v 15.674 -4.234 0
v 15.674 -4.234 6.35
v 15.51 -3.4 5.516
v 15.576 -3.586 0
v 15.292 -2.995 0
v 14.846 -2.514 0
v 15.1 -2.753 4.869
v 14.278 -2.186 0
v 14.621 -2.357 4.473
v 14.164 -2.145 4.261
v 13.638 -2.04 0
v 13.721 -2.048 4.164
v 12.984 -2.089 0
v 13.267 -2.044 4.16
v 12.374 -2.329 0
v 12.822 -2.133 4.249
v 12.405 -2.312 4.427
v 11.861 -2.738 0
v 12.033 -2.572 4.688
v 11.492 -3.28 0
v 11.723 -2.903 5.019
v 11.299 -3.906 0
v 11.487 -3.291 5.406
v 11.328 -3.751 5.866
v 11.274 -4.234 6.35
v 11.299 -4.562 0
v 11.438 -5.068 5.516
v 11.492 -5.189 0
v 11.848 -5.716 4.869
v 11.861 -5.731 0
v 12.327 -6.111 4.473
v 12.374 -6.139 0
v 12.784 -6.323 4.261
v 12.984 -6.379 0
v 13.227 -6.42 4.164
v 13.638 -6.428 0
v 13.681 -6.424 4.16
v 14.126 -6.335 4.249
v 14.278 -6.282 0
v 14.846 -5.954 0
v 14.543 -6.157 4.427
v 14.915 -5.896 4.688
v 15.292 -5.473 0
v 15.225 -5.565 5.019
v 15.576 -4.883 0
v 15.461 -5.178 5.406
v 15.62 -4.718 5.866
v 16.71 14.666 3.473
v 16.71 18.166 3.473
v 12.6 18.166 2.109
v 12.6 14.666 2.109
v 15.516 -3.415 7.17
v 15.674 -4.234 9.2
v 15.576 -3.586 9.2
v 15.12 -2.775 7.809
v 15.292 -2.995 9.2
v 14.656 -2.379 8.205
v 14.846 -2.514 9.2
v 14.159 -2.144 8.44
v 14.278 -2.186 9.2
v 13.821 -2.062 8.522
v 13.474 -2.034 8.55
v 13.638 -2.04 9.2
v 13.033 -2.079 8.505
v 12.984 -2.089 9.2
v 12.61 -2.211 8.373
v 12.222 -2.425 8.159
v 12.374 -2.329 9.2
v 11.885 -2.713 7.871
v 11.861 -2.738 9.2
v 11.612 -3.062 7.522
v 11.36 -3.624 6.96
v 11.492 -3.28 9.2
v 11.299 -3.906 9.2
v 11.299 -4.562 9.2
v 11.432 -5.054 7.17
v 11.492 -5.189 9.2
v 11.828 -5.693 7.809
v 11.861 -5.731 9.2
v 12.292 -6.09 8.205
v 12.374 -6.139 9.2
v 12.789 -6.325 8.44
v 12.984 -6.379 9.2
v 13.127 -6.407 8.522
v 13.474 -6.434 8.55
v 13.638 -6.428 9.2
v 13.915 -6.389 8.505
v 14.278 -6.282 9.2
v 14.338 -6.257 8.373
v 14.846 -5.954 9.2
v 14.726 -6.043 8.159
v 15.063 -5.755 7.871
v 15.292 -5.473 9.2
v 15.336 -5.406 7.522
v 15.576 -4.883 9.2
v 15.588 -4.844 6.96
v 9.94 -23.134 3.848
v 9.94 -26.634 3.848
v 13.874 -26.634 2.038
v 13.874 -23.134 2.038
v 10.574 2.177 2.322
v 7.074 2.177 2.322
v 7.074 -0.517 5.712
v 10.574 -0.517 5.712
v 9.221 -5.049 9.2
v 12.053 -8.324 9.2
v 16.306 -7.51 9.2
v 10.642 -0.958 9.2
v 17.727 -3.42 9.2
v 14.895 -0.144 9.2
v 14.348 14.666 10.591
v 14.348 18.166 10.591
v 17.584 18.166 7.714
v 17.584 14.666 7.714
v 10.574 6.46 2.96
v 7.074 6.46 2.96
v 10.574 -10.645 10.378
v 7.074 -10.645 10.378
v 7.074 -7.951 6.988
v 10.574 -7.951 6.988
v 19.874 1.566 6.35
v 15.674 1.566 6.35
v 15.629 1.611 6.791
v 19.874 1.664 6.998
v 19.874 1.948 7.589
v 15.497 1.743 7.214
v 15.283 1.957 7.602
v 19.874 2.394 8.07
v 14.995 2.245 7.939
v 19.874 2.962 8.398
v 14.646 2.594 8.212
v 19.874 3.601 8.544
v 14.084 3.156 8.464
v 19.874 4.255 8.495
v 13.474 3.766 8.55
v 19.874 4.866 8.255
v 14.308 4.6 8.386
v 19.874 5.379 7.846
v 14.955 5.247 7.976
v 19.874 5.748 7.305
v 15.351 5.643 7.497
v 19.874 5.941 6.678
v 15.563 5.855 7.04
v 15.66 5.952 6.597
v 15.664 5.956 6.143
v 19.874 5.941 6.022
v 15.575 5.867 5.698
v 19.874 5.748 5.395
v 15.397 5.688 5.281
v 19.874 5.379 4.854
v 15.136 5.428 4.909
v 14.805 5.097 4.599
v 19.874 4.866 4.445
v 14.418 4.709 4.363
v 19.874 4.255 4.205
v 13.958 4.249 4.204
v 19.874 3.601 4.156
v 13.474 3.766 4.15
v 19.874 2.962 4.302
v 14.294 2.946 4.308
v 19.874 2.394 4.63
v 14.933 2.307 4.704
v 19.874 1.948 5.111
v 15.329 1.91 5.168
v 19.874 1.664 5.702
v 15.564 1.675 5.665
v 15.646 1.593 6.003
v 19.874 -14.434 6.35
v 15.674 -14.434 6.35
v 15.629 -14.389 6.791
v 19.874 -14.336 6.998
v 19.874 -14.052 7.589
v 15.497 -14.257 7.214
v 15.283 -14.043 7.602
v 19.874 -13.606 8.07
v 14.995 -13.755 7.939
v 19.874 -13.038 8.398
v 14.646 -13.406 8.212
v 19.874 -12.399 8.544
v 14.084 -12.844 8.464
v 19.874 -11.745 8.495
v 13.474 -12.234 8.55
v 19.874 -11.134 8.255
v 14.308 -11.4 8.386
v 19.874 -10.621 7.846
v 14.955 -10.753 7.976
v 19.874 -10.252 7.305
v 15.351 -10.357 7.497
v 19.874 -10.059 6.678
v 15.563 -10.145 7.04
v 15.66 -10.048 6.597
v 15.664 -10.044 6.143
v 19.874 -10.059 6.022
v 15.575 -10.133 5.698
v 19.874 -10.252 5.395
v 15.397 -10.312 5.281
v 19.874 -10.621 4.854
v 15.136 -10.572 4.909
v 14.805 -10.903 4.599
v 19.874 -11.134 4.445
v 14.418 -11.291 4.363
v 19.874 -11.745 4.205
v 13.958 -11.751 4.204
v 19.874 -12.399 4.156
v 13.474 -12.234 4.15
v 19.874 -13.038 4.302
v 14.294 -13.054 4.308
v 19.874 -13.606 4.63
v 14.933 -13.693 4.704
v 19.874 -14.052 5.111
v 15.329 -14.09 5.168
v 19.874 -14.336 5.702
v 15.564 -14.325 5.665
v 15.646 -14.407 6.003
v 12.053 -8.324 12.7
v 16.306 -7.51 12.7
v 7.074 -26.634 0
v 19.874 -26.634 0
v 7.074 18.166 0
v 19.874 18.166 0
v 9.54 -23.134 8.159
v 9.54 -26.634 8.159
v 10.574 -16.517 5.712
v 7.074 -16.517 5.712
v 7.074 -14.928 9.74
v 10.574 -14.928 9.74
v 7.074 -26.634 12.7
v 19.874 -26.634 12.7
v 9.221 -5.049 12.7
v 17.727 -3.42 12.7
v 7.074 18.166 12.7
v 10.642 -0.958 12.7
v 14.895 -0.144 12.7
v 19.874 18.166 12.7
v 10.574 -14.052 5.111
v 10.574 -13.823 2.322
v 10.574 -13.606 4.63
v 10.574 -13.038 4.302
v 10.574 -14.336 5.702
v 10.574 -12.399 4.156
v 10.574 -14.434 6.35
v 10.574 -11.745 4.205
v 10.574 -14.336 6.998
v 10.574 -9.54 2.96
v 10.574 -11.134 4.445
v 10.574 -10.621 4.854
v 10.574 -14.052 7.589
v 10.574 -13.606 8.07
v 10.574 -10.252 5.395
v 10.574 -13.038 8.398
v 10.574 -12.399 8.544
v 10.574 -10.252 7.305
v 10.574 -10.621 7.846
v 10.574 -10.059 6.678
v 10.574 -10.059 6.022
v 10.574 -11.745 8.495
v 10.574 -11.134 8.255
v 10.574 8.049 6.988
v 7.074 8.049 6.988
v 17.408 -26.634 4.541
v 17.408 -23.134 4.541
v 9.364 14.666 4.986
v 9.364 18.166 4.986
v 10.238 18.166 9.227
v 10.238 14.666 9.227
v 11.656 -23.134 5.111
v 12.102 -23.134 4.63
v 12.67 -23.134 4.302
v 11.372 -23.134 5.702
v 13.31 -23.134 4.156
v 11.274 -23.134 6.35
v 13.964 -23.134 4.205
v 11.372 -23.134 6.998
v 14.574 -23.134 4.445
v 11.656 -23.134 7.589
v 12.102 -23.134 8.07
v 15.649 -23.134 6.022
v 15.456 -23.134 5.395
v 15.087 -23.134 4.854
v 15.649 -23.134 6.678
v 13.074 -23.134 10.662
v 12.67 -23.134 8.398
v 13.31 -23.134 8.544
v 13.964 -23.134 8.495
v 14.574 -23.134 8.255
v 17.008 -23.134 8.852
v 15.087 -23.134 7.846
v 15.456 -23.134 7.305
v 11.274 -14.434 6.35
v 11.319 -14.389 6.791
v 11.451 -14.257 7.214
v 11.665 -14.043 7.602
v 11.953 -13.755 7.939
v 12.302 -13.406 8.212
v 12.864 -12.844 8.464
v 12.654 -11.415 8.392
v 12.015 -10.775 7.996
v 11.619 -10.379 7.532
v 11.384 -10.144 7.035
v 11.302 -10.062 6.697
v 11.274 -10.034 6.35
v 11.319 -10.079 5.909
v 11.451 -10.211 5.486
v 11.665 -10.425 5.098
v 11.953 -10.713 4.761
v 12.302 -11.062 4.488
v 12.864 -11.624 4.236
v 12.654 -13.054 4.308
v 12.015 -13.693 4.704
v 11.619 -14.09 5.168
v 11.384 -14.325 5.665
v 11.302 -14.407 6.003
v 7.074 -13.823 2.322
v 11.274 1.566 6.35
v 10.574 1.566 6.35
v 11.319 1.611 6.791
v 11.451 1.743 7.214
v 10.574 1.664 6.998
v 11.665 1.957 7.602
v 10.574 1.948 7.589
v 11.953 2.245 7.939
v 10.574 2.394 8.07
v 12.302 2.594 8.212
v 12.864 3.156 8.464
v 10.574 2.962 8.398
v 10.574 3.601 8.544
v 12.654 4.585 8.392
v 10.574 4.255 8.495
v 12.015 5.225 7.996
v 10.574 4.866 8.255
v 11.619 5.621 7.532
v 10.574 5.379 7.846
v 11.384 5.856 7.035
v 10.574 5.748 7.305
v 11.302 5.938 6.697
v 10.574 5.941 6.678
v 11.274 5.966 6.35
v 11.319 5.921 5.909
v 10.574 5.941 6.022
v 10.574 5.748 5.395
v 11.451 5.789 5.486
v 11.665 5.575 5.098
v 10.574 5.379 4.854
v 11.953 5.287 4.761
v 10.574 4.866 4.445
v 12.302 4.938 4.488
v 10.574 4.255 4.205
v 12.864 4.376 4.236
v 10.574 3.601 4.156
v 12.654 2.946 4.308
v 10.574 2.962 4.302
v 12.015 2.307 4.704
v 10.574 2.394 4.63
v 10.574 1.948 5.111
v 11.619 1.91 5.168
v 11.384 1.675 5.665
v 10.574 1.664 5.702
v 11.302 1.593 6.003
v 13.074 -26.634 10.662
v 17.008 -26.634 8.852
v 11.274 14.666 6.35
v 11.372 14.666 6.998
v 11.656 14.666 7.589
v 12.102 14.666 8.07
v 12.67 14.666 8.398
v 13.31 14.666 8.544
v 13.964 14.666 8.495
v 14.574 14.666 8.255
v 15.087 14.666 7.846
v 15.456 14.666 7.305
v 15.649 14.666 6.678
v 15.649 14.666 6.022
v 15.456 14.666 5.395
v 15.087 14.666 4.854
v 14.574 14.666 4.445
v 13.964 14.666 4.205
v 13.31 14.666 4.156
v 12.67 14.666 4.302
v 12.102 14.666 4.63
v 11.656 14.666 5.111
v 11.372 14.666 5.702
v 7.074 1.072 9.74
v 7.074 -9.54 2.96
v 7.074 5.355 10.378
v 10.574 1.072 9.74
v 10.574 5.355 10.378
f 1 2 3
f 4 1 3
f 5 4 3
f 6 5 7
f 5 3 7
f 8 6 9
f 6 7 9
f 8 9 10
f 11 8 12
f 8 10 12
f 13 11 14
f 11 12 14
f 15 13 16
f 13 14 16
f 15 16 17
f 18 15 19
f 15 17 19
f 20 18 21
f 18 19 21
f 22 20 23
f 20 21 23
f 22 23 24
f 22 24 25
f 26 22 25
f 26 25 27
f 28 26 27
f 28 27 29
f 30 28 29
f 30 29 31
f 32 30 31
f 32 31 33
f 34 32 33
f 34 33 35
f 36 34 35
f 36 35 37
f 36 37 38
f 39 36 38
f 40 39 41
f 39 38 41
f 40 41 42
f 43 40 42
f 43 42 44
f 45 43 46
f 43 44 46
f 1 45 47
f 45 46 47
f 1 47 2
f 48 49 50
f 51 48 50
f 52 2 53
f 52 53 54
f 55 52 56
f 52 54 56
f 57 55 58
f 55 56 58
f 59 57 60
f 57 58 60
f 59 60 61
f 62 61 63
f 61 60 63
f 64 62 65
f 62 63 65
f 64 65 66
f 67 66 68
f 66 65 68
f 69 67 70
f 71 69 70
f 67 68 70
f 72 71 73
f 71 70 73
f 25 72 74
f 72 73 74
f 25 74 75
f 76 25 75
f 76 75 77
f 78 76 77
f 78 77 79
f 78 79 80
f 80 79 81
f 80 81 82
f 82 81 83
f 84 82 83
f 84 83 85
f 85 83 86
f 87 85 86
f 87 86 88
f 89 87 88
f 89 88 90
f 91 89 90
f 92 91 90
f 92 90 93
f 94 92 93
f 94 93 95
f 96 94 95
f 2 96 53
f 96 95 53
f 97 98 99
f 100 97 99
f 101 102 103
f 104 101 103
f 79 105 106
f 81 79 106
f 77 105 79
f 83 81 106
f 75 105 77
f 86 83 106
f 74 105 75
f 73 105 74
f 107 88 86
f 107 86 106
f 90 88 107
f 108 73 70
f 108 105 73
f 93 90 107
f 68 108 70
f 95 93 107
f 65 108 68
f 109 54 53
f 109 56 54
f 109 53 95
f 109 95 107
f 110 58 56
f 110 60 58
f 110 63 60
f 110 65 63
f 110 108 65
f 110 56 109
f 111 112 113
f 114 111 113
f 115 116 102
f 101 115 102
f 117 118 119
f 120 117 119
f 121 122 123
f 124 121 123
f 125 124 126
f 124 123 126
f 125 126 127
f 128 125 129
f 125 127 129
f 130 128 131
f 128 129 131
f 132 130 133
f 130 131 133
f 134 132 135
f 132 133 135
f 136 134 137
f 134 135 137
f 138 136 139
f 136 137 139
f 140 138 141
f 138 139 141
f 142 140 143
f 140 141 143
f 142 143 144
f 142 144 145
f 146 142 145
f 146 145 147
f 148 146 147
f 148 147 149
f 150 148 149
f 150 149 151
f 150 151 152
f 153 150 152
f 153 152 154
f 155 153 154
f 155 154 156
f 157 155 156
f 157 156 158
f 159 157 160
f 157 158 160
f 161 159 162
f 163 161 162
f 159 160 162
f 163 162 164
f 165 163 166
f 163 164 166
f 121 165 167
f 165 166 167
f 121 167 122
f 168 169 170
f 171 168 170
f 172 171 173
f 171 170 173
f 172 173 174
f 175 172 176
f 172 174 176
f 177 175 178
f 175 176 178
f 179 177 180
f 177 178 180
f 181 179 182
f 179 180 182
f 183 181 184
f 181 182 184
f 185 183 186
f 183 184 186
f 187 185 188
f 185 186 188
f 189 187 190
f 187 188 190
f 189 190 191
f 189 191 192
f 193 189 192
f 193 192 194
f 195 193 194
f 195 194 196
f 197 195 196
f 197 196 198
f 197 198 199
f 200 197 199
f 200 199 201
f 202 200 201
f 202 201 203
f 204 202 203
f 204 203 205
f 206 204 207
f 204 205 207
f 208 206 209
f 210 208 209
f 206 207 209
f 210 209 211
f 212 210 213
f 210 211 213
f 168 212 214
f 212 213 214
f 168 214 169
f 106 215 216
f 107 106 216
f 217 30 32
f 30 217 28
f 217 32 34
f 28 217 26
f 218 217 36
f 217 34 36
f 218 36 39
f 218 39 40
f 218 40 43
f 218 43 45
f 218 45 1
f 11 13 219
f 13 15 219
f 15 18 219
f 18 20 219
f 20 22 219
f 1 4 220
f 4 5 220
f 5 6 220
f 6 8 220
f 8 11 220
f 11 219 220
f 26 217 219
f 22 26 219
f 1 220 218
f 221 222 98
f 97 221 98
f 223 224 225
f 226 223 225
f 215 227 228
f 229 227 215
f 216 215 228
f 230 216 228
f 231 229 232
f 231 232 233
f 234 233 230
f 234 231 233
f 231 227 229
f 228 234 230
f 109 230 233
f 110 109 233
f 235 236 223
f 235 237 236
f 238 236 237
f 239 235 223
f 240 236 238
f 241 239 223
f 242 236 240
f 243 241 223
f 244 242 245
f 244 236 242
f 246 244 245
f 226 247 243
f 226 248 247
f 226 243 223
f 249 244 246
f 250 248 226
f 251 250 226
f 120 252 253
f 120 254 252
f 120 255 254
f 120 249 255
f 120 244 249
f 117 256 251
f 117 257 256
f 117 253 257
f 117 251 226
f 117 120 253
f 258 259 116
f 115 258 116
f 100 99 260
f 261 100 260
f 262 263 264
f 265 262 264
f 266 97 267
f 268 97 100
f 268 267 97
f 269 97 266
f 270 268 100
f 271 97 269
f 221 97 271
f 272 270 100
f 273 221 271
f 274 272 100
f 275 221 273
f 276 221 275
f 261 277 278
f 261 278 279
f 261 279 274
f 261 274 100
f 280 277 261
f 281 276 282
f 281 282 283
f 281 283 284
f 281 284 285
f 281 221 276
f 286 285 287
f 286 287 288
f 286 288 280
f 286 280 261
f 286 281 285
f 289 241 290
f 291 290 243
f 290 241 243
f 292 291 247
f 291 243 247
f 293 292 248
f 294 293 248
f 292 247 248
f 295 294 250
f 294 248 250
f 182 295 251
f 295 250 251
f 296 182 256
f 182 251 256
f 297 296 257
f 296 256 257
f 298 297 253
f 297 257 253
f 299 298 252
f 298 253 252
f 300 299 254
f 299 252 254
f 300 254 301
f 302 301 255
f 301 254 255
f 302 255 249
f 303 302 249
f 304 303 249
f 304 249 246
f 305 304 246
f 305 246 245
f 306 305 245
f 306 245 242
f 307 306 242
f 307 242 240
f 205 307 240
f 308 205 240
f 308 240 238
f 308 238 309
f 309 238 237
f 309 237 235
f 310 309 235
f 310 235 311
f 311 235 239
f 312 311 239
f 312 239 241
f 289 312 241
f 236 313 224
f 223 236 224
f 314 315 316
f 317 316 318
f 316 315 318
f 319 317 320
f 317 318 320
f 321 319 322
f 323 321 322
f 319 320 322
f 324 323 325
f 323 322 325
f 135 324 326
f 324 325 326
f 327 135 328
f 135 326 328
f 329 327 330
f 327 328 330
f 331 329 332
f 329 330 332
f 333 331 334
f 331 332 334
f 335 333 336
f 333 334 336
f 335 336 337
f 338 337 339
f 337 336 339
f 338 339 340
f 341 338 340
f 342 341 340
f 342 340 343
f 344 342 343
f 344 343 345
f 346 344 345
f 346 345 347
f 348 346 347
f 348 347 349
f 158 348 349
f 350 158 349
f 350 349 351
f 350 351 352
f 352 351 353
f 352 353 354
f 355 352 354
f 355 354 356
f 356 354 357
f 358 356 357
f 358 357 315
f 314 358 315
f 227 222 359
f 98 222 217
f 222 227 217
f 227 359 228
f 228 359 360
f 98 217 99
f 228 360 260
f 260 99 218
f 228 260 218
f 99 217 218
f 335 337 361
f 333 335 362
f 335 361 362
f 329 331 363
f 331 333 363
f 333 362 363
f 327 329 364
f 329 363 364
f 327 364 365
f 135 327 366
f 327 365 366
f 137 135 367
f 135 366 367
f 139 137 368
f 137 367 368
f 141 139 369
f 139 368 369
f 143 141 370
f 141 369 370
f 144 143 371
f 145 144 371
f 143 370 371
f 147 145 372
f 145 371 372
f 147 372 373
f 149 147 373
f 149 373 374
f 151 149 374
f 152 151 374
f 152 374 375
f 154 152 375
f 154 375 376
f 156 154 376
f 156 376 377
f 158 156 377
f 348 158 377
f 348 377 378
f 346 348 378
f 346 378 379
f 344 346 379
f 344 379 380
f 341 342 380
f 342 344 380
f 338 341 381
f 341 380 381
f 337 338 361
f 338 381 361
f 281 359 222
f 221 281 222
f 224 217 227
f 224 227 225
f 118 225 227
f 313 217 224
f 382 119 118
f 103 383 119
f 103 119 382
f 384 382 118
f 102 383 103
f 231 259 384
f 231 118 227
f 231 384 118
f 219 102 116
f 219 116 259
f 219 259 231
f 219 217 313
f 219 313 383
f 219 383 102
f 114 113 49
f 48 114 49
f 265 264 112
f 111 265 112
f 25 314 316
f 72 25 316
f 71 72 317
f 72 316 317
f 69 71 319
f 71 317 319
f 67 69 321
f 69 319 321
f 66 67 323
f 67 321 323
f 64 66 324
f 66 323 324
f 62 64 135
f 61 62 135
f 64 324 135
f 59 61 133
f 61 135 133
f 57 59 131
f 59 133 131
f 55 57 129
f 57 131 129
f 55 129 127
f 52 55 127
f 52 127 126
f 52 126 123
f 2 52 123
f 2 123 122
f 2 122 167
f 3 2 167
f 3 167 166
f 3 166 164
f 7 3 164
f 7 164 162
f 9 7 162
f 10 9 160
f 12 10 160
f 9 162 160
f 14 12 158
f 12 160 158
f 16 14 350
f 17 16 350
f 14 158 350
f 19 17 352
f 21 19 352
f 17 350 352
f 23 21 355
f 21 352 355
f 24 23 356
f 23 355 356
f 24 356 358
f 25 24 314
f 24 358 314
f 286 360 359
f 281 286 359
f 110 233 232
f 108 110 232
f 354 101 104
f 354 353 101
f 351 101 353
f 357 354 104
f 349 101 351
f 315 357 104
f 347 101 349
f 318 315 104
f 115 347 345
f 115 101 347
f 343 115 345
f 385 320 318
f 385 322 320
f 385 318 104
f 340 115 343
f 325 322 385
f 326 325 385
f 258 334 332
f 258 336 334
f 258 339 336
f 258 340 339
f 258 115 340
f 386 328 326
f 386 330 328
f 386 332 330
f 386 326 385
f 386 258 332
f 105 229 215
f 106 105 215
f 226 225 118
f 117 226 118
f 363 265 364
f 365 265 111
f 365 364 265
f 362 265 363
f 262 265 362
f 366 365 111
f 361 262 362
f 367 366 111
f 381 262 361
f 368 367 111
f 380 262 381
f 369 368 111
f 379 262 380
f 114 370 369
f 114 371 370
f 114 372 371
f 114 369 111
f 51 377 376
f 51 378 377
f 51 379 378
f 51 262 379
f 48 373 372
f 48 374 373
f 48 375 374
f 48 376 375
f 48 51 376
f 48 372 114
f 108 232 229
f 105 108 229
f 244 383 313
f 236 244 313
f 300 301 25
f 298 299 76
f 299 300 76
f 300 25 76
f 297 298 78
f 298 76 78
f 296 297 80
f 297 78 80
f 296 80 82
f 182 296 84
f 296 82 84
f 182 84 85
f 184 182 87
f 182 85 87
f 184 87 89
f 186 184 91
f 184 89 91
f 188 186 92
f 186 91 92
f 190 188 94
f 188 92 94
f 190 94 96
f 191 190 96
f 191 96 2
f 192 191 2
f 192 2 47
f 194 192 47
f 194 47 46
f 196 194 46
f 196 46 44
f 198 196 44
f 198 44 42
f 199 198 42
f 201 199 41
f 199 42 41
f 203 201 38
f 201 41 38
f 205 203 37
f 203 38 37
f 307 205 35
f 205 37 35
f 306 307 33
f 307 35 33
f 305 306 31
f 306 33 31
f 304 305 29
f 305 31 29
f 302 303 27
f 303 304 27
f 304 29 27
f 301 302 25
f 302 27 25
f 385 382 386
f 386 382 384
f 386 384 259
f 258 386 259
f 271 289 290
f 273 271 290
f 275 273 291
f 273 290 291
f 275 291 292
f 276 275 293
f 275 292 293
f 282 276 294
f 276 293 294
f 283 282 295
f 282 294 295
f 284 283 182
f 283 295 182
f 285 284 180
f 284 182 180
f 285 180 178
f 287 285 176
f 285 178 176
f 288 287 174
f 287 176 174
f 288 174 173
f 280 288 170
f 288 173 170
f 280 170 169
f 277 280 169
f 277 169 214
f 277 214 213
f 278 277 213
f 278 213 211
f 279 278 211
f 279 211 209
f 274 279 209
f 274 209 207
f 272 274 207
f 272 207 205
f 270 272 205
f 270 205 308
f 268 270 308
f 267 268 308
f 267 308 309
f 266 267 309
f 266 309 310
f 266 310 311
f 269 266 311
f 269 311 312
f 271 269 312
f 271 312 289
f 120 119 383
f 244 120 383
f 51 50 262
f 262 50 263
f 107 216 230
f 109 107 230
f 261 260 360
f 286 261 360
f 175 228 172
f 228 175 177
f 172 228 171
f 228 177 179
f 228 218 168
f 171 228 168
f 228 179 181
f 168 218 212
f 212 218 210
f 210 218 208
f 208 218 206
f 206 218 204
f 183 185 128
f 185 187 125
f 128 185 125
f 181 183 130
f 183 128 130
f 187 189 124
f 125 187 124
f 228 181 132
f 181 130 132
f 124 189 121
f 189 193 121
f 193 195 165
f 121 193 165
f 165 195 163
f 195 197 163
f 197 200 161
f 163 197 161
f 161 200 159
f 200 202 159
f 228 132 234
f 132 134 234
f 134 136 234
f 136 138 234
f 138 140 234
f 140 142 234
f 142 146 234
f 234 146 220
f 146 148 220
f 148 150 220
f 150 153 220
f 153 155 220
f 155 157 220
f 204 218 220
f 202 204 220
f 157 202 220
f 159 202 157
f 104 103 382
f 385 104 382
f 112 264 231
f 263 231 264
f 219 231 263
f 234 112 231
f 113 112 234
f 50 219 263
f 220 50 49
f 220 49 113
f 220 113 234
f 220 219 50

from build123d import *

# Parameters (mm, degrees)
SKETCH_1_W          = 12.8
SKETCH_1_H          = 44.8
EXTRUDE_1_DEPTH     = 12.7
SKETCH_2_R          = 2.2
CUT_EXTRUDE_1_DEPTH = 36.575886954
SKETCH_3_R          = 2.2
CUT_EXTRUDE_2_DEPTH = 33.16376457
SKETCH_4_R          = 2.2
CUT_EXTRUDE_3_DEPTH = 51.629102117
CUT_EXTRUDE_4_DEPTH = 3.5
CUT_EXTRUDE_5_DEPTH = 3.5
CUT_EXTRUDE_6_DEPTH = 3.5
CUT_EXTRUDE_7_DEPTH = 3.5


with BuildPart() as part:
    # 草圖1 → 填料-伸長1 (new body)
    with BuildSketch(Plane.XY):
        with Locations((13.474002647, -4.234146341)):
            Rectangle(SKETCH_1_W, SKETCH_1_H)
    extrude(amount=EXTRUDE_1_DEPTH)

    # 草圖2 → 除料-伸長1 (cut, through all)
    with BuildSketch(Plane.XY.offset(12.7)):
        with Locations((13.474002647, -4.234146341)):
            Circle(SKETCH_2_R)
    extrude(amount=-CUT_EXTRUDE_1_DEPTH, mode=Mode.SUBTRACT)

    # 草圖3 → 除料-伸長2 (cut, through all)
    with BuildSketch(Plane.ZY.offset(-7.074002647)):
        with Locations(Location((6.35, 3.765853659, 0), (0, 0, 270))):
            Circle(SKETCH_3_R)
        with Locations(Location((6.35, -12.234146341, 0), (0, 0, 270))):
            Circle(SKETCH_3_R)
    extrude(amount=-CUT_EXTRUDE_2_DEPTH, mode=Mode.SUBTRACT)

    # 草圖4 → 除料-伸長3 (cut, through all)
    with BuildSketch(Plane(origin=(0, 18.165853659, 0), x_dir=(1, 0, 0), z_dir=(0, 1, 0))):
        with Locations(Location((13.474002647, -6.35, 0), (0, 0, 180))):
            Circle(SKETCH_4_R)
    extrude(amount=-CUT_EXTRUDE_3_DEPTH, mode=Mode.SUBTRACT)

    # 草圖5 → 除料-伸長4 (cut)
    with BuildSketch(Plane.XY.offset(12.7)):
        Polygon((9.221190711, -5.048757069), (12.053070264, -8.324494879), (16.3058822, -7.509884151), (17.726814583, -3.419535613), (14.89493503, -0.143797803), (10.642123094, -0.958408532), align=None)
    extrude(amount=-CUT_EXTRUDE_4_DEPTH, mode=Mode.SUBTRACT)

    # 草圖6 → 除料-伸長5 (cut)
    with BuildSketch(Plane.ZY.offset(-7.074002647)):
        Polygon((9.740257522, -14.92787126), (10.377962971, -10.644959661), (6.987705449, -7.951234743), (2.959742478, -9.540421423), (2.322037029, -13.823333022), (5.712294551, -16.51705794), align=None)
        Polygon((9.740257522, 1.07212874), (10.377962971, 5.355040339), (6.987705449, 8.048765257), (2.959742478, 6.459578577), (2.322037029, 2.176666978), (5.712294551, -0.51705794), align=None)
    extrude(amount=-CUT_EXTRUDE_5_DEPTH, mode=Mode.SUBTRACT)

    # 草圖7 → 除料-伸長6 (cut)
    with BuildSketch(Plane.XZ.offset(26.634146341)):
        Polygon((17.407945653, 4.540554664), (17.007999778, 8.852171913), (13.074056771, 10.661617248), (9.540059641, 8.159445336), (9.940005516, 3.847828087), (13.873948523, 2.038382752), align=None)
    extrude(amount=-CUT_EXTRUDE_6_DEPTH, mode=Mode.SUBTRACT)

    # 草圖8 → 除料-伸長7 (cut)
    with BuildSketch(Plane(origin=(0, 18.165853659, 0), x_dir=(1, 0, 0), z_dir=(0, 1, 0))):
        Polygon((14.348050125, -10.590995285), (17.58383604, -7.713550322), (16.709788562, -3.472555037), (12.599955169, -2.109004715), (9.364169254, -4.986449678), (10.238216732, -9.227444963), align=None)
    extrude(amount=-CUT_EXTRUDE_7_DEPTH, mode=Mode.SUBTRACT)


solid = part.part
